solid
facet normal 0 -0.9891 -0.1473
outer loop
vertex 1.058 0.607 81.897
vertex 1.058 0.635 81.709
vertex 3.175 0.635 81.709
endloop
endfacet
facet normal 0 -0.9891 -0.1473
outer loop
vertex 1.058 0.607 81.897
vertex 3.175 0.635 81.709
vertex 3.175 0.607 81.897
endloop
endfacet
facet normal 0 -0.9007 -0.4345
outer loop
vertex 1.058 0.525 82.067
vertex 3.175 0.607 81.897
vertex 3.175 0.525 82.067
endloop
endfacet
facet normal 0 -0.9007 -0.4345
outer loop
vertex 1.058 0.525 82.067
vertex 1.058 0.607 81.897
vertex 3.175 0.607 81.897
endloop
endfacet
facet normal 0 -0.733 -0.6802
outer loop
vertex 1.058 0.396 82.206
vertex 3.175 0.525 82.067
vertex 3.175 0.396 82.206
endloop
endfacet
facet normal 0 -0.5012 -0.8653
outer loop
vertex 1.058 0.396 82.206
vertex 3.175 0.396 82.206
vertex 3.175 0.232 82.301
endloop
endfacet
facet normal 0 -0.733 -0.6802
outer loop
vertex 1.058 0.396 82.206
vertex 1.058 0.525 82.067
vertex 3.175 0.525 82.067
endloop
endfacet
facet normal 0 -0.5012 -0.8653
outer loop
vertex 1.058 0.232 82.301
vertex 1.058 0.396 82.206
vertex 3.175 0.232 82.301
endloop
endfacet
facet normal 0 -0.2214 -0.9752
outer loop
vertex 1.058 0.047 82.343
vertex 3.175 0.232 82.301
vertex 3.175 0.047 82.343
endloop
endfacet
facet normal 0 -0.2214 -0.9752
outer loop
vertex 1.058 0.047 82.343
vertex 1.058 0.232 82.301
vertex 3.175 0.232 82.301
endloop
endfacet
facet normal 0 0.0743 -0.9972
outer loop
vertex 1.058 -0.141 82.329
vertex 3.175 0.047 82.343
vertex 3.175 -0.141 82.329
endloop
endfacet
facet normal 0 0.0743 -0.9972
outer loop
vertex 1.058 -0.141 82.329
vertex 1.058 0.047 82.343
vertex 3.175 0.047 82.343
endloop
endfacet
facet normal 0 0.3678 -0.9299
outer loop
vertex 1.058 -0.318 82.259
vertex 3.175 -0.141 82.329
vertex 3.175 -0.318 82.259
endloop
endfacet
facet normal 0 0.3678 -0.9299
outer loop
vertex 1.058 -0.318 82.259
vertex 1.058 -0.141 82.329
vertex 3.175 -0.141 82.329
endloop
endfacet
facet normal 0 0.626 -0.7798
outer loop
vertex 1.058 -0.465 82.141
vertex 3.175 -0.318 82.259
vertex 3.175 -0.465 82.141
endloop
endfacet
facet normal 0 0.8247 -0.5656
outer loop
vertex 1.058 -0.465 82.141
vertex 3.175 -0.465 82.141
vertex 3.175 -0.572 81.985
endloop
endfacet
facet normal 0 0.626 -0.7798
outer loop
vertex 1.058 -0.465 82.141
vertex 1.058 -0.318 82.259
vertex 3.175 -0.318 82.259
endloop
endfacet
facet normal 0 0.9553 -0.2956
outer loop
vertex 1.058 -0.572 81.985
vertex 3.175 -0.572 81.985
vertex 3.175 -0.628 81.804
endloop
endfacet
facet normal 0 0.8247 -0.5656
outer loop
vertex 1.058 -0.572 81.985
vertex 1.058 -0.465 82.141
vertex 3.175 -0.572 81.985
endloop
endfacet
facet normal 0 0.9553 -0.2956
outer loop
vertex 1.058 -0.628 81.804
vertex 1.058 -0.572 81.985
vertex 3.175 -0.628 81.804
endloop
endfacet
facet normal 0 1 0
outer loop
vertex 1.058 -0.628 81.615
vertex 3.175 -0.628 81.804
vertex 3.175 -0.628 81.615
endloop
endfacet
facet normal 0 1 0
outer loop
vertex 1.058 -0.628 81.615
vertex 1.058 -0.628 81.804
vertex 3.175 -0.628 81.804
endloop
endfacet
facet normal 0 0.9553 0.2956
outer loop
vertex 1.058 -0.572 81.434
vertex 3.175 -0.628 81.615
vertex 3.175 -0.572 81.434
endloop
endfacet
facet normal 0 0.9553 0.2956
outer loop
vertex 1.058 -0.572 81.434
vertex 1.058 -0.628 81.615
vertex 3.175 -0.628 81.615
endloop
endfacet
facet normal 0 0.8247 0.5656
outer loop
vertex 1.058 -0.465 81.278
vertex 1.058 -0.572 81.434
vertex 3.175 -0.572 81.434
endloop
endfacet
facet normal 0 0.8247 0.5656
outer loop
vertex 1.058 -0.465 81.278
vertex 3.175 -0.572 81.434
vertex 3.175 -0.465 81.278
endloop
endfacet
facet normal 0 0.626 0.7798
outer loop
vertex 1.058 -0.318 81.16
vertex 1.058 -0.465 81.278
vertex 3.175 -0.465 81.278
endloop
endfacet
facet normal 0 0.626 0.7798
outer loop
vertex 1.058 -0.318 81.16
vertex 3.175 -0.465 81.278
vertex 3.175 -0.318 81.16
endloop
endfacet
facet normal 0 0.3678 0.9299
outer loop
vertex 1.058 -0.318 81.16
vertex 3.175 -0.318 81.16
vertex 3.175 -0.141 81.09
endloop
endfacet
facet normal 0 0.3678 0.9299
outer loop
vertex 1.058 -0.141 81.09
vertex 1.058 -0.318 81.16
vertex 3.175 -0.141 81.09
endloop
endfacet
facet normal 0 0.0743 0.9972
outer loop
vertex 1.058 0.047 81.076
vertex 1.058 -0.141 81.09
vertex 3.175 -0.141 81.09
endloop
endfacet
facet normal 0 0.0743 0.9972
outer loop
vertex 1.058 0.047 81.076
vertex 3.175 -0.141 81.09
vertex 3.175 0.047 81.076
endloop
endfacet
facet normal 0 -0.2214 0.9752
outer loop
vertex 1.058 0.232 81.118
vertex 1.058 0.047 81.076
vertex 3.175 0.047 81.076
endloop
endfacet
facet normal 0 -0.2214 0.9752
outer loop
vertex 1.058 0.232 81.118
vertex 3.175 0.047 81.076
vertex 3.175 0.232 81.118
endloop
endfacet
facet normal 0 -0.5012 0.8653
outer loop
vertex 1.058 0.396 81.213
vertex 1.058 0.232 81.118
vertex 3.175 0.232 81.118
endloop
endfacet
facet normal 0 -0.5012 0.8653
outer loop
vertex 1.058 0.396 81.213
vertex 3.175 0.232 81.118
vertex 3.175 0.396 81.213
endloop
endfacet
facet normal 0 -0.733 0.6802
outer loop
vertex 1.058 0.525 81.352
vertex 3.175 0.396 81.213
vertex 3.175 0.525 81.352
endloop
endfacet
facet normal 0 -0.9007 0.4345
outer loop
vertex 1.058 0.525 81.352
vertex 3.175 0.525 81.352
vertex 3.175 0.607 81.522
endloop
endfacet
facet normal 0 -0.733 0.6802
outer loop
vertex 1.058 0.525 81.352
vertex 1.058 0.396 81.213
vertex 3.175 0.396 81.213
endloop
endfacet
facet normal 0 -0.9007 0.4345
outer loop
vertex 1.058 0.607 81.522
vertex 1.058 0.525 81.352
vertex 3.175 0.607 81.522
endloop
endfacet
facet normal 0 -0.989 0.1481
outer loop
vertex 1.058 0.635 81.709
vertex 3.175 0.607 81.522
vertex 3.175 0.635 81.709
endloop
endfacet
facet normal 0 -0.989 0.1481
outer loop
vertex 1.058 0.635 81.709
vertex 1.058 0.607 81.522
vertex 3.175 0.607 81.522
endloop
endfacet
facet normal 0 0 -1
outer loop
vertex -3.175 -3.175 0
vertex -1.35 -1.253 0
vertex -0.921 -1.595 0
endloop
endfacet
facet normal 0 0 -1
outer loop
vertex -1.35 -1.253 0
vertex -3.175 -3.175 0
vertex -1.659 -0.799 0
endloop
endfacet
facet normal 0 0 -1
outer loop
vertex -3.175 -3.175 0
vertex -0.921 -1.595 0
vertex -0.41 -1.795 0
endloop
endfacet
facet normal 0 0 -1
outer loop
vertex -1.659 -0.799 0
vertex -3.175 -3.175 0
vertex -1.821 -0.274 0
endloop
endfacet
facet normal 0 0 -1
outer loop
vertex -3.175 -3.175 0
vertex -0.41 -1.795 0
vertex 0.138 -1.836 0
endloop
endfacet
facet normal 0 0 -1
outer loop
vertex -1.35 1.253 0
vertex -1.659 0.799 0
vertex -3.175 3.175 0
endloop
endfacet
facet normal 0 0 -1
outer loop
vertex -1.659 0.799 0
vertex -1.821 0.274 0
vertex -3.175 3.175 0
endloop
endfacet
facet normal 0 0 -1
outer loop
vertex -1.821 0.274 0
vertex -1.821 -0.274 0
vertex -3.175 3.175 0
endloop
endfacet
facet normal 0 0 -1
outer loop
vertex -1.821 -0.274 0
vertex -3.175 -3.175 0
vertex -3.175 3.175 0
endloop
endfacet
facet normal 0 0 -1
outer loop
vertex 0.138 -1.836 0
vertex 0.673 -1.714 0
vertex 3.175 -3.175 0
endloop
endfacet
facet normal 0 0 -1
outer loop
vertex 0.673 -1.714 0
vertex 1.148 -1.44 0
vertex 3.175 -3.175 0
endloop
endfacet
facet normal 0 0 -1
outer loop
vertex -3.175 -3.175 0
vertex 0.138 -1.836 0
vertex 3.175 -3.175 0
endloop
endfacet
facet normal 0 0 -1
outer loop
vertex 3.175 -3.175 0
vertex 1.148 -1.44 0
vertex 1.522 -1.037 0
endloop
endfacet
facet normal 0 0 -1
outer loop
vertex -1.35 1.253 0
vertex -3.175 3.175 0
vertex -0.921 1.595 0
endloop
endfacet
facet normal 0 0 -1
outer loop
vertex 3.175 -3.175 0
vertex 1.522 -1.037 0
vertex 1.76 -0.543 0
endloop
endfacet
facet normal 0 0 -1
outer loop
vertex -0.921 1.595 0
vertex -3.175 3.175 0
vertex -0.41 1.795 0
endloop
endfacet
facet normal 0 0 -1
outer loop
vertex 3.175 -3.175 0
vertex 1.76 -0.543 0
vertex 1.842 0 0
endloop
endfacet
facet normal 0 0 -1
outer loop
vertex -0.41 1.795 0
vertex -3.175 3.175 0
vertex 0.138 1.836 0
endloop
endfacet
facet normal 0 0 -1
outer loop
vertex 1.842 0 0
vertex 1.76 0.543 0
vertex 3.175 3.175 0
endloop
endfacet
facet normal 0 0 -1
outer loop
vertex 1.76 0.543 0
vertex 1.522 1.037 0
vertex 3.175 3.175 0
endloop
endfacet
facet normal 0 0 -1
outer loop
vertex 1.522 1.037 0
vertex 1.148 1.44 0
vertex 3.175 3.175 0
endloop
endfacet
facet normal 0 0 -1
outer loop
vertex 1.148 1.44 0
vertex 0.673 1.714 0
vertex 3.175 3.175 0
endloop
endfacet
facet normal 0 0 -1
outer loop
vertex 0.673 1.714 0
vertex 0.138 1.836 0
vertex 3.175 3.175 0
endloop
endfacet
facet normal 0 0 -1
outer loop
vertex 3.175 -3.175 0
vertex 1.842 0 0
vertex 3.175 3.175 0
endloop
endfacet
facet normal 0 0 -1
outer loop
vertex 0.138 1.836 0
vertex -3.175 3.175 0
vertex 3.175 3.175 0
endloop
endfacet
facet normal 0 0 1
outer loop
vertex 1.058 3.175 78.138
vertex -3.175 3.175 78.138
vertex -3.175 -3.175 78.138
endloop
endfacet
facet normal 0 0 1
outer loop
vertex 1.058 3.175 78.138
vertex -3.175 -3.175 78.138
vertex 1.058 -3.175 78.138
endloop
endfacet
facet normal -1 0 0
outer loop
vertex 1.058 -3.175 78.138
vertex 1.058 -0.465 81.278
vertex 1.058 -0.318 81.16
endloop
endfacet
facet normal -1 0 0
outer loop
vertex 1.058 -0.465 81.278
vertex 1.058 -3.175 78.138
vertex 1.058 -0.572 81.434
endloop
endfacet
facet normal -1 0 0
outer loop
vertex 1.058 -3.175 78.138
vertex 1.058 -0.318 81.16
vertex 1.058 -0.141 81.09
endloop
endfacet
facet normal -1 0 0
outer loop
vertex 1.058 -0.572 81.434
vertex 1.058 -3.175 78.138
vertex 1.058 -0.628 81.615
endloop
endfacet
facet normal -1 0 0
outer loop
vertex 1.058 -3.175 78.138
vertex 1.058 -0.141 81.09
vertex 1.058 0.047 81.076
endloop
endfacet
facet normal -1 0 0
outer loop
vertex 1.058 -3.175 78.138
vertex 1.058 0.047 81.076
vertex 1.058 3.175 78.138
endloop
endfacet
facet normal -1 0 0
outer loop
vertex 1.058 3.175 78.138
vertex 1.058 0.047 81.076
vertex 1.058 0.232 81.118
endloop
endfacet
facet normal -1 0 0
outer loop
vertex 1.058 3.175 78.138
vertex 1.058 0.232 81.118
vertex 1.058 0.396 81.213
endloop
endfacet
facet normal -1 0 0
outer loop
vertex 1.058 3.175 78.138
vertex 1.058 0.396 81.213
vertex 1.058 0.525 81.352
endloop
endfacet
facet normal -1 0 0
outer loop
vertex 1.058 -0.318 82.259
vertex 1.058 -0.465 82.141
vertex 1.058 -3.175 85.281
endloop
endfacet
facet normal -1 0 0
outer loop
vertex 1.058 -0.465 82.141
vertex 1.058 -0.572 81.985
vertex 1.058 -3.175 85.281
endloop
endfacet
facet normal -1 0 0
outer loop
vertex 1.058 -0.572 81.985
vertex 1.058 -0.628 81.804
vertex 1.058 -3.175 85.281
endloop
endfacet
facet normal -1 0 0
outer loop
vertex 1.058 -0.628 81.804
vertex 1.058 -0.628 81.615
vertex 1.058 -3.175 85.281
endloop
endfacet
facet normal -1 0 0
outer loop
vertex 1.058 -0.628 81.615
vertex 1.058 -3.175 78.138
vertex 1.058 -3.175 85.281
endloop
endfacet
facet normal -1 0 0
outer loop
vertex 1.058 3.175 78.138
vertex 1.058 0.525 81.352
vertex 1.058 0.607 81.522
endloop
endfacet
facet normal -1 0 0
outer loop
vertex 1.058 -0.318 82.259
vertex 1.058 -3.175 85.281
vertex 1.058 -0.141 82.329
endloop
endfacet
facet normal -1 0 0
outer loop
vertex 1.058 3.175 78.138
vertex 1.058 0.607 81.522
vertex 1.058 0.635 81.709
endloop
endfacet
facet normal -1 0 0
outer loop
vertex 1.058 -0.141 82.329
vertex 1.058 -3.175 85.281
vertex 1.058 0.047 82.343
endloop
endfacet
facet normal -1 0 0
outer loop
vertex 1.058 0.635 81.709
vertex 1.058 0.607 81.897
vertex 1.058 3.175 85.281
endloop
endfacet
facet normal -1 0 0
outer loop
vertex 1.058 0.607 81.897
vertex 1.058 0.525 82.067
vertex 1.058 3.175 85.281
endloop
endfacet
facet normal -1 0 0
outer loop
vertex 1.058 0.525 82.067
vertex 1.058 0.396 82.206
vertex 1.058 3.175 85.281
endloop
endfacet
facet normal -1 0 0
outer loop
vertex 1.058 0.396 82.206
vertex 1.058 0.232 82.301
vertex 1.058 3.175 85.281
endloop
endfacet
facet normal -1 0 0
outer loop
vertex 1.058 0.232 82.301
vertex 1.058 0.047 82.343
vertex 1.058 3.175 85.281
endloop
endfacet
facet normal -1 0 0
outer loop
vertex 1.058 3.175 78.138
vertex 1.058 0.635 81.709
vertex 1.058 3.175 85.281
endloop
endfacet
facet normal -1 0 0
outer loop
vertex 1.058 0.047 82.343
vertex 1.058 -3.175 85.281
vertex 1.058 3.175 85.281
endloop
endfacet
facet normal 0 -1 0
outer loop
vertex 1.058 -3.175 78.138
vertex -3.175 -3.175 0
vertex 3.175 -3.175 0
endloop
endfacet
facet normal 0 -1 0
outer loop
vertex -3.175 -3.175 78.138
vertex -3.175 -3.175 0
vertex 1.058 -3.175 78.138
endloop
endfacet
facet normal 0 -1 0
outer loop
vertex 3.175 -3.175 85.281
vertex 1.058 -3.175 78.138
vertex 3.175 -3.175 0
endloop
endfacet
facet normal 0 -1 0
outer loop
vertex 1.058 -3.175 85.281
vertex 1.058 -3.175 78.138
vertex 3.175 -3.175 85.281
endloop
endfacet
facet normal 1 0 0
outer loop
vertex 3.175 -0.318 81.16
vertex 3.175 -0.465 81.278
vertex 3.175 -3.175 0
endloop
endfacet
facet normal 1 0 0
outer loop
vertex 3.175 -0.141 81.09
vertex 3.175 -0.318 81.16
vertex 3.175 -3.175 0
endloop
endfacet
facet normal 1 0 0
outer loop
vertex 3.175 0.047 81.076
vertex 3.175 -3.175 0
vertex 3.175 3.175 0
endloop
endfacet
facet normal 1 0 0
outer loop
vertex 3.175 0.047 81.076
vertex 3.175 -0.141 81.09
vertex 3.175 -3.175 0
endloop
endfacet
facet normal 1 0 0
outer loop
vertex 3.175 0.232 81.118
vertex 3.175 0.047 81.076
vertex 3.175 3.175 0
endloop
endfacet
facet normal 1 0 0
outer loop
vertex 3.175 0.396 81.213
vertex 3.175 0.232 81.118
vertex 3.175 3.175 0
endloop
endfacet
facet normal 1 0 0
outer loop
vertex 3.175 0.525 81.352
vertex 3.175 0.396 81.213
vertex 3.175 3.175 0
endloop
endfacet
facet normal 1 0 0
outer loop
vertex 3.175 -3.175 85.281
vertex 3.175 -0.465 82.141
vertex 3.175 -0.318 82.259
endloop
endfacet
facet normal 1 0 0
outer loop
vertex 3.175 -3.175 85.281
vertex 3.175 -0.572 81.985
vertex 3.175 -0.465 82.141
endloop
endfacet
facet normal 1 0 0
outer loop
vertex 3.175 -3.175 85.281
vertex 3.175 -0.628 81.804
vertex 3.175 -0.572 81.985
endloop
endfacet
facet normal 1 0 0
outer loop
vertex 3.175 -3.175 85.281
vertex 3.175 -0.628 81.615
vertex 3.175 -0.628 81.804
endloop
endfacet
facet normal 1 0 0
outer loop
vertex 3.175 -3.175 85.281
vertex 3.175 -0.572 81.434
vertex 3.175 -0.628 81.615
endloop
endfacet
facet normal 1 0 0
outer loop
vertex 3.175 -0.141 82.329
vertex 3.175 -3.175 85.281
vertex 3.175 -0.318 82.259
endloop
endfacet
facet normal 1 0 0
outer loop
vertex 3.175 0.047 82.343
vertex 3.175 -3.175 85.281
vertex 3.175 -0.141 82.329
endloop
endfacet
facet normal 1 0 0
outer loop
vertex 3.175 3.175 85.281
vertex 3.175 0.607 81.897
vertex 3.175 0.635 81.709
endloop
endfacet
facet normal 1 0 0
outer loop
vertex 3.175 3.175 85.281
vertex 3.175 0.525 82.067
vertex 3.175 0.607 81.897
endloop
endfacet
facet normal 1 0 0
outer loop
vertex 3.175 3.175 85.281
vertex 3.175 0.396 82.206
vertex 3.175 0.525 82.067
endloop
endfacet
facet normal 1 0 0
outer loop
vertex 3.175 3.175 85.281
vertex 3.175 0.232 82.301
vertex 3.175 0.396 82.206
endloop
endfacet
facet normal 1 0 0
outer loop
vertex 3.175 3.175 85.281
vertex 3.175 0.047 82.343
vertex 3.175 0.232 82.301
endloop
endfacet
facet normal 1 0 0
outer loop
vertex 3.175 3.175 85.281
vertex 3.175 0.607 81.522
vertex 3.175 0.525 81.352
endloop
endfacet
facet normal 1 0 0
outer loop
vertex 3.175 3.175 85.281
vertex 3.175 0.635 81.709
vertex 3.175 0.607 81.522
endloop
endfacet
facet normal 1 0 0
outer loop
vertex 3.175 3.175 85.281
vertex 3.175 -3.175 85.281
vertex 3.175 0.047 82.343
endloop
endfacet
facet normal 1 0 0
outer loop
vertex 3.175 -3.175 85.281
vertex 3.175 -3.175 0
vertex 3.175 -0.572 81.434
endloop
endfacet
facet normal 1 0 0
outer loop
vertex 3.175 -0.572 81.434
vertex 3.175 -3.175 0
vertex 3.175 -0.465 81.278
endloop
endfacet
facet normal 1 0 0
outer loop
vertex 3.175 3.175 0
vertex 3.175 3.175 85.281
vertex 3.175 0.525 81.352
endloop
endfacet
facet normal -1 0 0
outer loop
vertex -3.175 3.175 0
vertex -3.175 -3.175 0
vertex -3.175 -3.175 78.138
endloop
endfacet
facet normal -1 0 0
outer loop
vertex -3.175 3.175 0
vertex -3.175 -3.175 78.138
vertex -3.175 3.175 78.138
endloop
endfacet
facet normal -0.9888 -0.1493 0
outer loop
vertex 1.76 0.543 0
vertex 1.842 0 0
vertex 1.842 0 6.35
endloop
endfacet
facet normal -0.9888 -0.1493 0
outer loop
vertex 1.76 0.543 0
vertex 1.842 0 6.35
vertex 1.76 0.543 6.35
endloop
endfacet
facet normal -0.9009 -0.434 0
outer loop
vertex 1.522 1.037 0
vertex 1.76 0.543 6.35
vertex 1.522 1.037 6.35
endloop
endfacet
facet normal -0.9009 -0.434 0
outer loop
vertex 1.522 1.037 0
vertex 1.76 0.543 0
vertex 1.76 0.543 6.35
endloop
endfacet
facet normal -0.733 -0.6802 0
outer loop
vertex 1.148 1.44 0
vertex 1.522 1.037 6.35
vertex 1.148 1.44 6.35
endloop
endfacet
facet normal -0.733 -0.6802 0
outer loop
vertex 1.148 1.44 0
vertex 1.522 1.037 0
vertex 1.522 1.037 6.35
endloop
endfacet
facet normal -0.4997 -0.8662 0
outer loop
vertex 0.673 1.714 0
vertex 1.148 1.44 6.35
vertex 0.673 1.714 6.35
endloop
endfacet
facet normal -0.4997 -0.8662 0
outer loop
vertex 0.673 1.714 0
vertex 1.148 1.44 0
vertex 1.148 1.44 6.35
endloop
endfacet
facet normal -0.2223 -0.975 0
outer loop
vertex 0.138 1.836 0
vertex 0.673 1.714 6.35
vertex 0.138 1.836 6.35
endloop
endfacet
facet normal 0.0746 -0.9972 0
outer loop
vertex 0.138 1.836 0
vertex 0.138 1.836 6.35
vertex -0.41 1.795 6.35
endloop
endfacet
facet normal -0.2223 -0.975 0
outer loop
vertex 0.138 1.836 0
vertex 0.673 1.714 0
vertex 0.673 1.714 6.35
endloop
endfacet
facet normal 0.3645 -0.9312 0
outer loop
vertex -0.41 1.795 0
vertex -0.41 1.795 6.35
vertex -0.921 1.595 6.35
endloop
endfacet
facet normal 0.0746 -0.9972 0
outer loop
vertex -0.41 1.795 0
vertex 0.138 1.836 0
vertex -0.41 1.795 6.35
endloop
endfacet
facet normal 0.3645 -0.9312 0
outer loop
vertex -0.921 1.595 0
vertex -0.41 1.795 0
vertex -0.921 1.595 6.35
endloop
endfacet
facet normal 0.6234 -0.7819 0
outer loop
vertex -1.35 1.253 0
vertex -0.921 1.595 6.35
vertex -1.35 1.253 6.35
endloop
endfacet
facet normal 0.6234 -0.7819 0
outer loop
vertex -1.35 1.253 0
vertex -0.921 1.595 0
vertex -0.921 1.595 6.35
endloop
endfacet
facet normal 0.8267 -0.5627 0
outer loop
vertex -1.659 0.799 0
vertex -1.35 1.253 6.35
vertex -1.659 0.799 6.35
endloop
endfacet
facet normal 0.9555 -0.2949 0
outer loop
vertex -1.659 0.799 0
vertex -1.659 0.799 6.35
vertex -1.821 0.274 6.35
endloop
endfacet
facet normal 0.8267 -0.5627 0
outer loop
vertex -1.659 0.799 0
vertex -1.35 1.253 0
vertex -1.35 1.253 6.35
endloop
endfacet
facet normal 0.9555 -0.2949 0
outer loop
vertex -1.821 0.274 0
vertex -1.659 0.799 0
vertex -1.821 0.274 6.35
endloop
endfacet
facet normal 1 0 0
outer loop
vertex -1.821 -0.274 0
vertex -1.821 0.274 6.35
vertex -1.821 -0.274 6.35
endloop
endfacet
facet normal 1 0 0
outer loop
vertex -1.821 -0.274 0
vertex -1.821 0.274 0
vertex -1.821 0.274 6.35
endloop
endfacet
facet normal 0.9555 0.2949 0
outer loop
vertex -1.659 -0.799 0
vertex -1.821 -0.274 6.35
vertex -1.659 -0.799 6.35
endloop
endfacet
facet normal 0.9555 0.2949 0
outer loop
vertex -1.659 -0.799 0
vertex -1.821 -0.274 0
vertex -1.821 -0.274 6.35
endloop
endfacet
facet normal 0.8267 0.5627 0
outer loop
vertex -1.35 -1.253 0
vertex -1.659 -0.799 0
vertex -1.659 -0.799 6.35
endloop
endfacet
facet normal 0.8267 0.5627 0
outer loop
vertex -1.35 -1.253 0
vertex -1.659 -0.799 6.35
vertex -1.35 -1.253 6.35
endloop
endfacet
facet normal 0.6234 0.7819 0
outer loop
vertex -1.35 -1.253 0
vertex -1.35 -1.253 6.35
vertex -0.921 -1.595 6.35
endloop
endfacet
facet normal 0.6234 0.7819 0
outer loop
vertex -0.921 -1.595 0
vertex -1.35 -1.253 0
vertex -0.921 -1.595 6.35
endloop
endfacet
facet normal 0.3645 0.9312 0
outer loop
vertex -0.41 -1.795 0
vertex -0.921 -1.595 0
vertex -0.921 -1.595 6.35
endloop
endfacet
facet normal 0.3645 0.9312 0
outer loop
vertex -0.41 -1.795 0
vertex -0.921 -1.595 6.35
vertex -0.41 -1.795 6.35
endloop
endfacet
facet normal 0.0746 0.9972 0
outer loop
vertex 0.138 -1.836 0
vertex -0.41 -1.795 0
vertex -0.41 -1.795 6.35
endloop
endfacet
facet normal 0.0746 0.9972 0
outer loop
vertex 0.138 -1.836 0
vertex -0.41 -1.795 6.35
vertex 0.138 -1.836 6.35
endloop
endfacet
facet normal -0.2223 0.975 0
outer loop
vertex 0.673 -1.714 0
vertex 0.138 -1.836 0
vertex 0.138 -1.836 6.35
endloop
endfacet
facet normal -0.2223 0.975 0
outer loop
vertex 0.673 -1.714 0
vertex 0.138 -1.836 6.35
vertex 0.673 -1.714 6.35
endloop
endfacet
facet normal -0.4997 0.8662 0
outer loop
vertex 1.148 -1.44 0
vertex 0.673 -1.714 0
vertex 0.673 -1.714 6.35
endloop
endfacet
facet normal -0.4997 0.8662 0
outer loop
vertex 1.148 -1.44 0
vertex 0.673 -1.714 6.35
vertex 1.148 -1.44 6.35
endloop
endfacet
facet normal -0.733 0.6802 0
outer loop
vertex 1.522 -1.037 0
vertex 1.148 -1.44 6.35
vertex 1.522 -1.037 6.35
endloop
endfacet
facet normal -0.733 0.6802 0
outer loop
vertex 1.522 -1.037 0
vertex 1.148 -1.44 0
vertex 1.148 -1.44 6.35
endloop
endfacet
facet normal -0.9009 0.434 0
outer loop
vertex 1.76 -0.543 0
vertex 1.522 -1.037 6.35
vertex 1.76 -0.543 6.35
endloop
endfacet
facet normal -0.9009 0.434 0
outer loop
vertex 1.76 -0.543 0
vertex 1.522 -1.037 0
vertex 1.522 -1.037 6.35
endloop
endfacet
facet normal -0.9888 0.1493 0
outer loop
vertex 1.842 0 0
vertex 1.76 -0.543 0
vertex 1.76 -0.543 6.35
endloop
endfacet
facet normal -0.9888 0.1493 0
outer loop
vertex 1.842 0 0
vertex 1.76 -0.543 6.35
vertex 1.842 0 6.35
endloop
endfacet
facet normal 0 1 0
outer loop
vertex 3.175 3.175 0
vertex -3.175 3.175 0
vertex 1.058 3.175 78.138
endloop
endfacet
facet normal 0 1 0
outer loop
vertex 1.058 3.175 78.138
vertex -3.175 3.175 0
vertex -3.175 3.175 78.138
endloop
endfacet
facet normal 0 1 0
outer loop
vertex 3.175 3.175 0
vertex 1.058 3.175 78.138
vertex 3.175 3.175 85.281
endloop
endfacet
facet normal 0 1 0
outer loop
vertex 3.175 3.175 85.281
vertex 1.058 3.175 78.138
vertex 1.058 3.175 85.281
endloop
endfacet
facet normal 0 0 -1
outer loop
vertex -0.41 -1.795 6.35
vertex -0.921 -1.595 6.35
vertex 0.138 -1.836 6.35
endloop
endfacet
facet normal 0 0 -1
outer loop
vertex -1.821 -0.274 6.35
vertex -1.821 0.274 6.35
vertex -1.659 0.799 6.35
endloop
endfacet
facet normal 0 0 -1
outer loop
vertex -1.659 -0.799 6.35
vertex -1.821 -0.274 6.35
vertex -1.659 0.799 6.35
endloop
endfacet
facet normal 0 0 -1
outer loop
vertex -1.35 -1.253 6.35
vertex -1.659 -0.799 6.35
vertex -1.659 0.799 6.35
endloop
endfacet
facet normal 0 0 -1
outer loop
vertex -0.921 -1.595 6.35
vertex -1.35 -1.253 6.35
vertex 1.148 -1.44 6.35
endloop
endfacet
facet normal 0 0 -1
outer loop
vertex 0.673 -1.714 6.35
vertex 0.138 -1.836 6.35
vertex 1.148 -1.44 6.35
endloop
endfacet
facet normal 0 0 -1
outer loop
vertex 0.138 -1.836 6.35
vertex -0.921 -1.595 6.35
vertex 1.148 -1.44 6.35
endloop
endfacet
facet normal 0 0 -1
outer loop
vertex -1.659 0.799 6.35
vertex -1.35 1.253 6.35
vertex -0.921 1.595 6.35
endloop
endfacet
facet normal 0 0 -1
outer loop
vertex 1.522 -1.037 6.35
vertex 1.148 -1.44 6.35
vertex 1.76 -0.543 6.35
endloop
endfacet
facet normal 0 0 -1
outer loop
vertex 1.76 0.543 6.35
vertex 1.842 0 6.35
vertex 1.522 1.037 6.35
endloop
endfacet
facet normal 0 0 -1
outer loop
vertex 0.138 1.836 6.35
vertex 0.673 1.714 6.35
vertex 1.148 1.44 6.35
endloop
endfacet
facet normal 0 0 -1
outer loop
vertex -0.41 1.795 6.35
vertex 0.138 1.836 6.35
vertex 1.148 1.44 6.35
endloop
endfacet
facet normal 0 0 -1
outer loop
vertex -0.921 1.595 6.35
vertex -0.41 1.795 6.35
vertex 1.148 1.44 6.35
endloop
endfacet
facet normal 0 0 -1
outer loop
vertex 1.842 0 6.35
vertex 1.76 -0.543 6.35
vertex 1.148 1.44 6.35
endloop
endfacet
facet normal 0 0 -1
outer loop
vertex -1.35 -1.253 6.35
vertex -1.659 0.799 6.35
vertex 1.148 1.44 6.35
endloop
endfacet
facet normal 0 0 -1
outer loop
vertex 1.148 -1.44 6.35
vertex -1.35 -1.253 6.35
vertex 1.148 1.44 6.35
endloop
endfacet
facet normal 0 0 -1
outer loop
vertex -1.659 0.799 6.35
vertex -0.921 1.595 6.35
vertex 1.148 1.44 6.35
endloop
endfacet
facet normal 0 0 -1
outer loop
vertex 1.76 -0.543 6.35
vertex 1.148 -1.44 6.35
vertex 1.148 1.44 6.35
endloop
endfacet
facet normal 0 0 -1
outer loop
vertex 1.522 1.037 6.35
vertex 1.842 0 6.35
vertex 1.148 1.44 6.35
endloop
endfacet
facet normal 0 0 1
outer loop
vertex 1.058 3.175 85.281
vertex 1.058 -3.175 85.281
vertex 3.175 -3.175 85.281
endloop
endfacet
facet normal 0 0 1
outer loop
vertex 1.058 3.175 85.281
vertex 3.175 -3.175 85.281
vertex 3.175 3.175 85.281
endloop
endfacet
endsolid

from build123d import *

# Parameters (mm, degrees)
F0_W     = 6.35
F0_H     = 6.35
F0_R     = 1.8415
F1_DEPTH = 78.1375882
F2_DEPTH = 6.35
F4_START = 1.0583333333
F3_W     = 6.35
F3_H     = 7.14375
F3_R     = 0.635
F4_DEPTH = 2.1166666667


with BuildPart() as f1:
    # F0 (on Top) → F1 (new body)
    with BuildSketch(Plane.XY):
        Rectangle(F0_W, F0_H)
        Circle(F0_R, mode=Mode.SUBTRACT)
        Circle(F0_R)
    extrude(amount=F1_DEPTH)

    # F0 (on Top) → F2 (cut)
    with BuildSketch(Plane.XY):
        Circle(F0_R)
    extrude(amount=F2_DEPTH, mode=Mode.SUBTRACT)

    # F3 (on Right) → F4 (join)
    with BuildSketch(Plane.YZ.offset(F4_START)):
        with Locations((0, 81.7094632)):
            Rectangle(F3_W, F3_H)
        with Locations((0, 81.7094632)):
            Circle(F3_R, mode=Mode.SUBTRACT)
    extrude(amount=F4_DEPTH)


solid = f1.part
